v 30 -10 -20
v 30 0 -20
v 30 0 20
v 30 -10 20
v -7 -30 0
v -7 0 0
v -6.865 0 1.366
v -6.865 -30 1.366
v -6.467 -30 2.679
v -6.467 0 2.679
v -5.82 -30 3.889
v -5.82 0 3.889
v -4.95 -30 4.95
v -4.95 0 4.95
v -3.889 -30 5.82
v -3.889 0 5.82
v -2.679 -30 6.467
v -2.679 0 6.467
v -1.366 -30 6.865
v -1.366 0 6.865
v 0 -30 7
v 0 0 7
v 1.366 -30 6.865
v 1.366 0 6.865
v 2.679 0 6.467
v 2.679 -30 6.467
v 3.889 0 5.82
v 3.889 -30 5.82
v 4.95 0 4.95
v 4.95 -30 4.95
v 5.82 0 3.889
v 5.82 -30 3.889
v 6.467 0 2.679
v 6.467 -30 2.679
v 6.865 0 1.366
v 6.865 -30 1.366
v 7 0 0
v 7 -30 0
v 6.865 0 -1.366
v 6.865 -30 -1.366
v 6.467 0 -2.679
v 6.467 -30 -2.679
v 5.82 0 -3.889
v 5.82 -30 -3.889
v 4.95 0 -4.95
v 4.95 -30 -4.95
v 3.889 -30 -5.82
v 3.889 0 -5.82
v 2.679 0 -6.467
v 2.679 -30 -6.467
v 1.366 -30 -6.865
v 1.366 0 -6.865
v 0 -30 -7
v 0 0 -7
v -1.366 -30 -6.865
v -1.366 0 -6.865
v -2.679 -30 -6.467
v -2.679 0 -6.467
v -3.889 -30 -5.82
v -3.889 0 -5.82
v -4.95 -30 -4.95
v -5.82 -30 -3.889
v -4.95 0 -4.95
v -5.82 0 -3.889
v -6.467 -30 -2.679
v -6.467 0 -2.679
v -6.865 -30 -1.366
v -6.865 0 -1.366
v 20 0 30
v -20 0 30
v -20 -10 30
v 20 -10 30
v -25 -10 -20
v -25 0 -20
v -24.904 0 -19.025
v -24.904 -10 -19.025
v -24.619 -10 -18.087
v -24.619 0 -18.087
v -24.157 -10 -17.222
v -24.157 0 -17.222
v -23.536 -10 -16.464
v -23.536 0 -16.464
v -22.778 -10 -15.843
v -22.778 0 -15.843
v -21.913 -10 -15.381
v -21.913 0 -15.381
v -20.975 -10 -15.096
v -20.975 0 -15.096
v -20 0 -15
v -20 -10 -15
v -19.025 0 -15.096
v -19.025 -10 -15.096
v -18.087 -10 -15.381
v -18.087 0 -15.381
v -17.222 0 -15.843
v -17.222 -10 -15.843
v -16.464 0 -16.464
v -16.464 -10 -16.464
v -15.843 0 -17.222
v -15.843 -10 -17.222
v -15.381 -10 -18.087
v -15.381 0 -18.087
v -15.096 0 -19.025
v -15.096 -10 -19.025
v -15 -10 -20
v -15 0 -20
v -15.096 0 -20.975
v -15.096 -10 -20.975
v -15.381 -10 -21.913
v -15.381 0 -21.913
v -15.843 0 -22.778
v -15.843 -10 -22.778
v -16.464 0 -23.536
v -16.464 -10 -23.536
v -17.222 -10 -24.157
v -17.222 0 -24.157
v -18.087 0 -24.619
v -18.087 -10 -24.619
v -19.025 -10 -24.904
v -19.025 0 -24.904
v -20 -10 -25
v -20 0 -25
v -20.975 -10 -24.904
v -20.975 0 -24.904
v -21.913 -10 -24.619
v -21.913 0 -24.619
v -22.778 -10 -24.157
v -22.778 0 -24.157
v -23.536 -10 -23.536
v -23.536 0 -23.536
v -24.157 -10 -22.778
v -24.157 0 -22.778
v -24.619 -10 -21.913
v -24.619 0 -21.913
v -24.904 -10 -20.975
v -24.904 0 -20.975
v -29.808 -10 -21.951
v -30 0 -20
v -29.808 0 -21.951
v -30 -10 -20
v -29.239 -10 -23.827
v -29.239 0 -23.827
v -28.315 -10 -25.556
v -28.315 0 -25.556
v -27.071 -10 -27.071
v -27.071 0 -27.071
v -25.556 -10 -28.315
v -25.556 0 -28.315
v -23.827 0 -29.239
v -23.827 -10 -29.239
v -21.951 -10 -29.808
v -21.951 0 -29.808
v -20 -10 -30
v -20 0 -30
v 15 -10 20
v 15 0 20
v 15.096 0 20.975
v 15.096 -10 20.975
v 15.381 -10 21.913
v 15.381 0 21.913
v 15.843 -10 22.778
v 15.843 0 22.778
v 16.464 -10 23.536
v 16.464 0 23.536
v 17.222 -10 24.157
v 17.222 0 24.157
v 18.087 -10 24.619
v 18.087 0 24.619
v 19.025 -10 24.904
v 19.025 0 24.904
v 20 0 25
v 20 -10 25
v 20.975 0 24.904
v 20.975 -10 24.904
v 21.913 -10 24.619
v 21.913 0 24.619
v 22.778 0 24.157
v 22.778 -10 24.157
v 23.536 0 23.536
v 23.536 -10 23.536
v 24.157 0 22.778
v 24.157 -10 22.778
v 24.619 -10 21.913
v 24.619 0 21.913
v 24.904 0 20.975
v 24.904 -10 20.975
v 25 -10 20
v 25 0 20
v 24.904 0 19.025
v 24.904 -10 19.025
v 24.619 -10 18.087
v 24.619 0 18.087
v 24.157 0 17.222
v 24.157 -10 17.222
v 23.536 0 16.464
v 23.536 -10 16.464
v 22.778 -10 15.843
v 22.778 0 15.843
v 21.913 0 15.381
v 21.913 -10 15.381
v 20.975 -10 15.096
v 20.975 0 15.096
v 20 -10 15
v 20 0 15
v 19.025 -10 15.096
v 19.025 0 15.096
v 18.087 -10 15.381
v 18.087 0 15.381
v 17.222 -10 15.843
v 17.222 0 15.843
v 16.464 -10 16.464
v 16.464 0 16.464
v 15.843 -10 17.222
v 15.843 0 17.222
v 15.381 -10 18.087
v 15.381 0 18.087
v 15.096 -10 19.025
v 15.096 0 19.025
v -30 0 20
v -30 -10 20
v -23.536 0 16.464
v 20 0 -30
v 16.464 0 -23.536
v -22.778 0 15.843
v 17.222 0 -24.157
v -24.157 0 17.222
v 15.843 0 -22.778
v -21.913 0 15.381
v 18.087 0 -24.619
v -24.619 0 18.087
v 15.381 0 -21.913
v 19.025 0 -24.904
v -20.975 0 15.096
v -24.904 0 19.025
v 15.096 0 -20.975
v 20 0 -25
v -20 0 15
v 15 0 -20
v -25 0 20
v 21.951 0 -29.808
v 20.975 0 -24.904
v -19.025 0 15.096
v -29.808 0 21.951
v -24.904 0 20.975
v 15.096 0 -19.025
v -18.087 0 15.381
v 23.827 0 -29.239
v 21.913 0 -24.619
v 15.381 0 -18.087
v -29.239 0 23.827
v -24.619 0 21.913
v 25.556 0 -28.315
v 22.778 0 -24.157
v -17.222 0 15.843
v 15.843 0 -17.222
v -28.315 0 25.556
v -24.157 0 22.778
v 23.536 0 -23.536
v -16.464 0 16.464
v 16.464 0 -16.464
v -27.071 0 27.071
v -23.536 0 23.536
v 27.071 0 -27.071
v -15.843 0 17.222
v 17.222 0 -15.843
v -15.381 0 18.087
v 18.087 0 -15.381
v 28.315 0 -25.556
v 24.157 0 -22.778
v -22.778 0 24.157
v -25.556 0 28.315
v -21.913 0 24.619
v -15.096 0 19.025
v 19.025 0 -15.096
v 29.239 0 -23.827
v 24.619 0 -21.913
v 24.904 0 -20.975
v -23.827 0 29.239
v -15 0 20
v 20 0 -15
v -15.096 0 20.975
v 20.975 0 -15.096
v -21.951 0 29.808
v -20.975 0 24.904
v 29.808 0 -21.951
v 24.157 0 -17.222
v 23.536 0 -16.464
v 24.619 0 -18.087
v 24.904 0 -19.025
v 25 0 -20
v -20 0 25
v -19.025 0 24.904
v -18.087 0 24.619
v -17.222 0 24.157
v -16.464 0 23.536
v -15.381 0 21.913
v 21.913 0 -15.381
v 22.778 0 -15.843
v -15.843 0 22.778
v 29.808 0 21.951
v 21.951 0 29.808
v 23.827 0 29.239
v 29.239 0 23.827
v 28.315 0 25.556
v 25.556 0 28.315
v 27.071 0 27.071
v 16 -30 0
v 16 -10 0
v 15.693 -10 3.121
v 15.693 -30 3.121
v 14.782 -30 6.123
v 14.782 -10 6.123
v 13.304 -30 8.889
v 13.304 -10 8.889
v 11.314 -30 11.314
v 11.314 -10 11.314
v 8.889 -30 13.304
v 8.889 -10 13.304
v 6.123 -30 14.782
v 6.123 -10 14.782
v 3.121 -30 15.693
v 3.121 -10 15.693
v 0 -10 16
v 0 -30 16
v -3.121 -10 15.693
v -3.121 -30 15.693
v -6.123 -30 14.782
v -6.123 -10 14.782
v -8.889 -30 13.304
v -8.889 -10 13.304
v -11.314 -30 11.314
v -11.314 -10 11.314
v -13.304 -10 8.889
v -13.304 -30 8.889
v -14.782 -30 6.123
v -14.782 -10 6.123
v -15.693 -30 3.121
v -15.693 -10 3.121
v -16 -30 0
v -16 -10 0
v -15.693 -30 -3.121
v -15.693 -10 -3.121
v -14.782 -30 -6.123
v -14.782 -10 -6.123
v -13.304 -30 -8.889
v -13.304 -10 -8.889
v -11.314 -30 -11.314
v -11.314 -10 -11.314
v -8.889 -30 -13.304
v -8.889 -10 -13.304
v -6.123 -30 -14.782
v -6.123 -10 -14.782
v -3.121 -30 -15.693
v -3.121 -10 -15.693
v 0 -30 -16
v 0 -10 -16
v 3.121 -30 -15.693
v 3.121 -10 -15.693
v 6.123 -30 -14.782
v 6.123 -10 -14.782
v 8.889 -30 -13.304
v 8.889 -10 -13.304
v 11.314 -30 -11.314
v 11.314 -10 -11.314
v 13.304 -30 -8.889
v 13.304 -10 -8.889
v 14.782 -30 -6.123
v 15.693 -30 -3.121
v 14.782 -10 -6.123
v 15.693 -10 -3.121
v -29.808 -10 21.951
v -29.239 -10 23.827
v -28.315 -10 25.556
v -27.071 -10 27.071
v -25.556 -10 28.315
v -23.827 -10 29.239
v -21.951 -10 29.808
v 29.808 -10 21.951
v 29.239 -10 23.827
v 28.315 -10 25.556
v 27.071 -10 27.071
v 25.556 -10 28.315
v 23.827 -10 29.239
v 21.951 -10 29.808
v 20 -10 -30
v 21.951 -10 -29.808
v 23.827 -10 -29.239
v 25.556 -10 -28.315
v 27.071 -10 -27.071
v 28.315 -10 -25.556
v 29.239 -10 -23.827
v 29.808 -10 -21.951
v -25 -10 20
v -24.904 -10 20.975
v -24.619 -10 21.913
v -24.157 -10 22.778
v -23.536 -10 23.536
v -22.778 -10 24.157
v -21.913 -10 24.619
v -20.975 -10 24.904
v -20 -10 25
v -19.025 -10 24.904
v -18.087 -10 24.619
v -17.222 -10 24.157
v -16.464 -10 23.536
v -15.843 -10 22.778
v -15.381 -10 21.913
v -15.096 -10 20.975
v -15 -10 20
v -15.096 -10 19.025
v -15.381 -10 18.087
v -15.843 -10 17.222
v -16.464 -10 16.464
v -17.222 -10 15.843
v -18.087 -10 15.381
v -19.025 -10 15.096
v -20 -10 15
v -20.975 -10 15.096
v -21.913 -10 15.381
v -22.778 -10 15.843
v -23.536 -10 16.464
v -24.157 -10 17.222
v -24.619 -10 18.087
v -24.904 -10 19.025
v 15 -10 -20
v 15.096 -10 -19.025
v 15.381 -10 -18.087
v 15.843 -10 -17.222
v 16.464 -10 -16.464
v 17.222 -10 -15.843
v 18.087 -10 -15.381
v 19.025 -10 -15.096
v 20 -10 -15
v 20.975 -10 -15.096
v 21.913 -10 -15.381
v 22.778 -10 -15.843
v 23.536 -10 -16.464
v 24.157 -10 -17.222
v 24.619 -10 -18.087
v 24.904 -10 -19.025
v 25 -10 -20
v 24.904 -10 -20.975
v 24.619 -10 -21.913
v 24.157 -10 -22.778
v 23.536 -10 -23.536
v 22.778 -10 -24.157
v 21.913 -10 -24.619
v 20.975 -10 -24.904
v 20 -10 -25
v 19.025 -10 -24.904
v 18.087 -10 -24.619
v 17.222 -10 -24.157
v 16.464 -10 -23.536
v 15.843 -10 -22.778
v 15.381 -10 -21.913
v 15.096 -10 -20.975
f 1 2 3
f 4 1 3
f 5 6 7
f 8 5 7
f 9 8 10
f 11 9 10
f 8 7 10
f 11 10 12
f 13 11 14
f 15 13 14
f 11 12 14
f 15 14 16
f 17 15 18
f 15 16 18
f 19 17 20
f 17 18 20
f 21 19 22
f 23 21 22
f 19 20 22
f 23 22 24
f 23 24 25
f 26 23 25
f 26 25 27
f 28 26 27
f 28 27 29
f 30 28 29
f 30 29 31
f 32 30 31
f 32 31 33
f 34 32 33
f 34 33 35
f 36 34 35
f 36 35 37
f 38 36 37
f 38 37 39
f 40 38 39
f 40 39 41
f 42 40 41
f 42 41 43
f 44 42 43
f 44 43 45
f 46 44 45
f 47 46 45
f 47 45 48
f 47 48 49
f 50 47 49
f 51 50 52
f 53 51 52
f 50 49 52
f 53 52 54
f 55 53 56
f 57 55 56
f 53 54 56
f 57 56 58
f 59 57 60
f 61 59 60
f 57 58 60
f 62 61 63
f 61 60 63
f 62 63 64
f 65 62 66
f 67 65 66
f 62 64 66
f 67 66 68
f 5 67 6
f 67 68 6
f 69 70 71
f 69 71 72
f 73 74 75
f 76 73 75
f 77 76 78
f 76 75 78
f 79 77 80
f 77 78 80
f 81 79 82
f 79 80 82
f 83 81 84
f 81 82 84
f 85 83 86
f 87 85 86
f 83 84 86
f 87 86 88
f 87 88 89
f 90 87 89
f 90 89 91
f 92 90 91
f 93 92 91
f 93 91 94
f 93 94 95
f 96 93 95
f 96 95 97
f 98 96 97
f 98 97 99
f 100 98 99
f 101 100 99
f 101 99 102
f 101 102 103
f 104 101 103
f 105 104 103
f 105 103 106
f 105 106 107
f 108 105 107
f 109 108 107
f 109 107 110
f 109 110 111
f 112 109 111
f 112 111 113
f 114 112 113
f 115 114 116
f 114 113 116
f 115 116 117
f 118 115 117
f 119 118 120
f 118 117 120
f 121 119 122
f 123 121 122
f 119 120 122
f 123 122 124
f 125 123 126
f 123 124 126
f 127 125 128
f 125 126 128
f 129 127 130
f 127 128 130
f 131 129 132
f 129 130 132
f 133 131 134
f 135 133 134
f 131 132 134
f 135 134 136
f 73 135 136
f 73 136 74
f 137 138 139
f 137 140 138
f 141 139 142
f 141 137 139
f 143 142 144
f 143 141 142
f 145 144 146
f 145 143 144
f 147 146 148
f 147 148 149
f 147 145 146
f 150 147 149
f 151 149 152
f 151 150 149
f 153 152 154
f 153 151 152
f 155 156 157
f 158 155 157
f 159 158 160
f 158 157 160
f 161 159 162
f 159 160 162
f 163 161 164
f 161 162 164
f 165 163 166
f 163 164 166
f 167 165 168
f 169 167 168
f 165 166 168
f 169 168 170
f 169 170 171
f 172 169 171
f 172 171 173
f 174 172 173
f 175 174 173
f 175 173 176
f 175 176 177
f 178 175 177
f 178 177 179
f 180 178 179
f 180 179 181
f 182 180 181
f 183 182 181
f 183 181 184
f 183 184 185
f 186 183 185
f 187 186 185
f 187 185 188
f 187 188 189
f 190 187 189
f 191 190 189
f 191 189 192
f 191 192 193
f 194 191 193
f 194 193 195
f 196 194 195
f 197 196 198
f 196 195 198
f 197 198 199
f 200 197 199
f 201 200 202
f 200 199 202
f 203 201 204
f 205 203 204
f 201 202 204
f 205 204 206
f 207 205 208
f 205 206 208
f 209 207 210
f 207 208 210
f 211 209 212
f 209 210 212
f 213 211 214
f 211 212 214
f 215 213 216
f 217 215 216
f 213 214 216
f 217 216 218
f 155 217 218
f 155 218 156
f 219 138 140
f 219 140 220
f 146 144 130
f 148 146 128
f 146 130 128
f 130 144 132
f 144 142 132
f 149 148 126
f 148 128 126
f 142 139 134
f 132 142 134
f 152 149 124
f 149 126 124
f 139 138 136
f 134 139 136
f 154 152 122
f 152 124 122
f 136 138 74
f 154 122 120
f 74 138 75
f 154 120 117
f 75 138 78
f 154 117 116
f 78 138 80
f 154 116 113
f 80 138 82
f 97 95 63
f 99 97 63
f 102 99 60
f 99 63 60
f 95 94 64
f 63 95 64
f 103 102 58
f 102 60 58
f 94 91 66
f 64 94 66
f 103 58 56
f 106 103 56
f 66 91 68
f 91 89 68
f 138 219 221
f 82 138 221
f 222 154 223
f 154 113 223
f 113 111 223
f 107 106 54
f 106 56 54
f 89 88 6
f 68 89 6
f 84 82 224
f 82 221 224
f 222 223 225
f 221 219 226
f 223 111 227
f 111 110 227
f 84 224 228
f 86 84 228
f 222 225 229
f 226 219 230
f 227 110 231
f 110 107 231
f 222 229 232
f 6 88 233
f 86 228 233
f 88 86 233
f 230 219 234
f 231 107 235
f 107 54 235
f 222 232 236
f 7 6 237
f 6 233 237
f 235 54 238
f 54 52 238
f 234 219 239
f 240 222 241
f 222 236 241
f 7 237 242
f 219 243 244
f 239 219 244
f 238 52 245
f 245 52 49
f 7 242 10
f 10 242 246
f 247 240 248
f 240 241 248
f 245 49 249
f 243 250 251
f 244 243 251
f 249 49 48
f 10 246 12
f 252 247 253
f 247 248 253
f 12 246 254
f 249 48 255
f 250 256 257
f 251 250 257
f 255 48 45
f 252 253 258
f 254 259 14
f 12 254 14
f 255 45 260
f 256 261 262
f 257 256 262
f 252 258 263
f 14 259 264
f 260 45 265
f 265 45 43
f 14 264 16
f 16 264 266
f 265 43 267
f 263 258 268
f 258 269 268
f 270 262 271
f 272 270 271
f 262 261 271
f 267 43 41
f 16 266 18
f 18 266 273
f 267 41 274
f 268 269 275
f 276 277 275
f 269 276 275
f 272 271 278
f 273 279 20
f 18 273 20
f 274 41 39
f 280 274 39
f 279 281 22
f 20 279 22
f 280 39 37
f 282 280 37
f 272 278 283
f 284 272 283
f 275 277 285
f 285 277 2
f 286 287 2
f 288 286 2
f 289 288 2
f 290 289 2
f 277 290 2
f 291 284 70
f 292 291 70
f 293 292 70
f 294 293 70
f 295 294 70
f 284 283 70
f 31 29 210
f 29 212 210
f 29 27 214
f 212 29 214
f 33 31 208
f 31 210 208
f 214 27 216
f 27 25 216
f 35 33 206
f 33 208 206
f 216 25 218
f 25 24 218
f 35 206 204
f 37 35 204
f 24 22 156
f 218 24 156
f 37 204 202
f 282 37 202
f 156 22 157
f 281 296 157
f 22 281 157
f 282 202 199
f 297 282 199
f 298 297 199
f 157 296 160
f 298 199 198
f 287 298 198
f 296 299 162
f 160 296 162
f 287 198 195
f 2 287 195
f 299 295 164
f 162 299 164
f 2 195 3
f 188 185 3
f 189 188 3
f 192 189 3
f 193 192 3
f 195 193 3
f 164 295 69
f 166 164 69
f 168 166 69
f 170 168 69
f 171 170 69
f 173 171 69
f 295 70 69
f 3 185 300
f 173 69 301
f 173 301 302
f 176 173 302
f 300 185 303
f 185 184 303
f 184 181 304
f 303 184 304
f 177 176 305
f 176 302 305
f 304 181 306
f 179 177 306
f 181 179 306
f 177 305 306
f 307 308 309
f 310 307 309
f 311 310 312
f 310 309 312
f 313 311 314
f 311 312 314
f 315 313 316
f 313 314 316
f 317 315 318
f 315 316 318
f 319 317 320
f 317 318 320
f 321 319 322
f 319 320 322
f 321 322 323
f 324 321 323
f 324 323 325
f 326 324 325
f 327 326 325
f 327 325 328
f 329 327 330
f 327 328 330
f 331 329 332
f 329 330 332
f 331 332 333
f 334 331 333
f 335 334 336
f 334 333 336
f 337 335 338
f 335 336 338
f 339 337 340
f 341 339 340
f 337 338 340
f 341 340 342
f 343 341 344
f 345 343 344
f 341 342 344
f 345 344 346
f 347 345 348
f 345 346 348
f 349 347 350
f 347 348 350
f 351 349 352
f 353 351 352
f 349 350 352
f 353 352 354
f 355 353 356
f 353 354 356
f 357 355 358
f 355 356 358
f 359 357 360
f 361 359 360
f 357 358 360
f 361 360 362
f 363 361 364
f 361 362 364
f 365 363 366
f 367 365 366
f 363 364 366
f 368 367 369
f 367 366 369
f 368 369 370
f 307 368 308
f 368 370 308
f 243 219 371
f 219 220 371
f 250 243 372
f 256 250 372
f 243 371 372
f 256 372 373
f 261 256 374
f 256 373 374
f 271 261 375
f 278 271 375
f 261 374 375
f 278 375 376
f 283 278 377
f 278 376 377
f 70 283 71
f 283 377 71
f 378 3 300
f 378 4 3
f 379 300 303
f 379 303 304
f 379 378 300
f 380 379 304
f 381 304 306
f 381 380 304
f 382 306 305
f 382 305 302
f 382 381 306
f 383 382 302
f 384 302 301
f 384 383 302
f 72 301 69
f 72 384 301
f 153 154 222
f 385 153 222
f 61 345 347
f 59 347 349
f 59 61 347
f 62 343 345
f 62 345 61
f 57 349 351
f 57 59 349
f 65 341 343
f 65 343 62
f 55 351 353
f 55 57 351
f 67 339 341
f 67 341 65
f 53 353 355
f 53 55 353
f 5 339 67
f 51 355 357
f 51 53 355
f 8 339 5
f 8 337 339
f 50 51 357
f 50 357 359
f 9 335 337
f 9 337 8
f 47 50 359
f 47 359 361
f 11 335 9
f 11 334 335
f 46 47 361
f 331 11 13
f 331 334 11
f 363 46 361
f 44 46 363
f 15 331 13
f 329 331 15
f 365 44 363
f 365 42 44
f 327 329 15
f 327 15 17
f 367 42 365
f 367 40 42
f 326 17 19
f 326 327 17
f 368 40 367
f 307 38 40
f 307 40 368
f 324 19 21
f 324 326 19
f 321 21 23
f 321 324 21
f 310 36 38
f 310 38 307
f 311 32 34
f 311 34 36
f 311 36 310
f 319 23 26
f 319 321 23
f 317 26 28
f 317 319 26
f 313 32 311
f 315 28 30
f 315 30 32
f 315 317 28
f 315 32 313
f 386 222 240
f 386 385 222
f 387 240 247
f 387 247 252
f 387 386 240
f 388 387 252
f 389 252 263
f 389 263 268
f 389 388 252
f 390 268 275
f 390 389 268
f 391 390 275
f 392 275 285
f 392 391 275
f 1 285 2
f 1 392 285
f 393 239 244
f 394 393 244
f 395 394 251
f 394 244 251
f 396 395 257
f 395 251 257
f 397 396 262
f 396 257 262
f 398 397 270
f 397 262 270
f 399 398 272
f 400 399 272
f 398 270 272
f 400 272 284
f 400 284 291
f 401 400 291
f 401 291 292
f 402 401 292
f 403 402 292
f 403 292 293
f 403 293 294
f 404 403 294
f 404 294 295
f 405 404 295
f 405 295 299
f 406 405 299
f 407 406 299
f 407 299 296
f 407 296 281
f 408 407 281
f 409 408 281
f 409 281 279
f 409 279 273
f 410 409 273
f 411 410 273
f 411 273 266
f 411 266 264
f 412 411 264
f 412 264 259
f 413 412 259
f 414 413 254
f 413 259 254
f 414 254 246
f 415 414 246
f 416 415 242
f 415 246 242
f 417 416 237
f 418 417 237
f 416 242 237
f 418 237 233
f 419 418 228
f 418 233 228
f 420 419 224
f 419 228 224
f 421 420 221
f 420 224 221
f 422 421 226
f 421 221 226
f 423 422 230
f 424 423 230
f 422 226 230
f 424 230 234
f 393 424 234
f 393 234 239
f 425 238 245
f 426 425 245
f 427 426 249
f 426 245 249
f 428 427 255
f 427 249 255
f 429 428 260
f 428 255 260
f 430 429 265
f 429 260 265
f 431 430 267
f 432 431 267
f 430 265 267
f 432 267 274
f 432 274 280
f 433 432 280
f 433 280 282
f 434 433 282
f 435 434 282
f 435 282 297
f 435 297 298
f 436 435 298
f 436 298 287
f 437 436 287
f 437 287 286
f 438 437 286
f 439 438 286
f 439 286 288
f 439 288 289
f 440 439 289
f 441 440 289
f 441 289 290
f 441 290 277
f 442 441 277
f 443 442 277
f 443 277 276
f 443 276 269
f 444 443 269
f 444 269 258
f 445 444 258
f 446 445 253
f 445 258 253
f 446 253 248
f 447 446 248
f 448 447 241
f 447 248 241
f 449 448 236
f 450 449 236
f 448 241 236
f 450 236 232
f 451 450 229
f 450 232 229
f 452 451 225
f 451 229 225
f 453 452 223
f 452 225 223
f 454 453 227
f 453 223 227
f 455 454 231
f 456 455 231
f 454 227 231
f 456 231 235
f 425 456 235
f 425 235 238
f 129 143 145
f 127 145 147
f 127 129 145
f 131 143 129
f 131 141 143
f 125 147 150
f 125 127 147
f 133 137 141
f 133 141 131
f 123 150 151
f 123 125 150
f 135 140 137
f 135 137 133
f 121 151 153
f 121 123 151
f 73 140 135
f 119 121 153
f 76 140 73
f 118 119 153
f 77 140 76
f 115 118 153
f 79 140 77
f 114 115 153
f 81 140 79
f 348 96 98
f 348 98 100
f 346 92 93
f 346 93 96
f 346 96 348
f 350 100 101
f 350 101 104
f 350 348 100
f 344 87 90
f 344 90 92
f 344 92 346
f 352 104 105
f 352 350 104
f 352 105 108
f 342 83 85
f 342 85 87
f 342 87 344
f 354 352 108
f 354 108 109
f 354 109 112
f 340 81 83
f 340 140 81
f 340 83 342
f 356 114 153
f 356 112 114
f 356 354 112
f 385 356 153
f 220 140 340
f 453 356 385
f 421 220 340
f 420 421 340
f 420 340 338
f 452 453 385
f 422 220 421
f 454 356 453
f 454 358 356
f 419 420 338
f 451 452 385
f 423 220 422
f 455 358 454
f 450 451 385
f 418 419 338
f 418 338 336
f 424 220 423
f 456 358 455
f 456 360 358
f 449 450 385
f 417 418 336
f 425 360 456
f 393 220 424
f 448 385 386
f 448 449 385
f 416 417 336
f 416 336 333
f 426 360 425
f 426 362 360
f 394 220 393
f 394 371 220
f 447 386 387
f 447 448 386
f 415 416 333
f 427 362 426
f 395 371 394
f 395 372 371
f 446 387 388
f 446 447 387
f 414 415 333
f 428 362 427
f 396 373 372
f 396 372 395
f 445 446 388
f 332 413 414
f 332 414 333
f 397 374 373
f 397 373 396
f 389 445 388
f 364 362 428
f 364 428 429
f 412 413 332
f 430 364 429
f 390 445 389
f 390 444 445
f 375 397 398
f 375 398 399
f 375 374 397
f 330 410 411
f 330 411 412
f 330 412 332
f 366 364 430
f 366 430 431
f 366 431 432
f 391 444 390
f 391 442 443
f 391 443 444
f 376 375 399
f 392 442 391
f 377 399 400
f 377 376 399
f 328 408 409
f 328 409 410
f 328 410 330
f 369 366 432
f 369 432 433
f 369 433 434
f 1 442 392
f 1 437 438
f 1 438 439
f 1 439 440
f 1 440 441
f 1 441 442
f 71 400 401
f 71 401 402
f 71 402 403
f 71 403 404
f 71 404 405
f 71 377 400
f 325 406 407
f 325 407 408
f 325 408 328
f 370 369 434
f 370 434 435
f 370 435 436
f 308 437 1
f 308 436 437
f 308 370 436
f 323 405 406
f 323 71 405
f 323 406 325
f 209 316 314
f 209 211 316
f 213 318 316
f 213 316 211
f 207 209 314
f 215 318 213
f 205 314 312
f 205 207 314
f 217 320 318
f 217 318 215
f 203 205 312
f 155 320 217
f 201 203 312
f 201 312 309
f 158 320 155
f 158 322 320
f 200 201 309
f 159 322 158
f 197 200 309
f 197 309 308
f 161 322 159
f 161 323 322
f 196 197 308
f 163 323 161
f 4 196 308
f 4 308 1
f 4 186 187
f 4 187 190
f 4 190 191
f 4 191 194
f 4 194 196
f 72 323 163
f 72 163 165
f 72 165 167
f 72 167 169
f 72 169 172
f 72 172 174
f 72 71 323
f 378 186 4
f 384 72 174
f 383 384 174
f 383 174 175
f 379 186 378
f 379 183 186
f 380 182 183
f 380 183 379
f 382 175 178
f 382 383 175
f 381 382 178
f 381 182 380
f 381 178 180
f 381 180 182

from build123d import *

# Parameters (mm, degrees)
F0_W     = 60
F0_H     = 60
F1_DEPTH = 10
F2_R     = 10
F4_D     = 10
F5_R     = 16
F6_DEPTH = 20
F8_D     = 14


with BuildPart() as f1:
    # F0 (on Front) → F1 (new body)
    with BuildSketch(Plane.XZ):
        Rectangle(F0_W, F0_H)
    extrude(amount=F1_DEPTH)

    # F2
    f2_edges = [f1.edges().sort_by_distance(p)[0] for p in [
        (-30, -5, 30),
        (-30, -5, -30),
        (30, -5, 30),
        (30, -5, -30),
    ]]
    fillet(f2_edges, radius=F2_R)

    # F4 (through all)
    with Locations(Plane.XZ.offset(10)):
        with Locations((-20, 20), (20, 20), (20, -20), (-20, -20)):
            Hole(F4_D / 2)

    # F5 (on face) → F6 (join)
    with BuildSketch(Plane.XZ.offset(10)):
        Circle(F5_R)
    extrude(amount=F6_DEPTH)

    # F8 (through all)
    with Locations(Plane.XZ.offset(30)):
        with Locations((0, 0)):
            Hole(F8_D / 2)


solid = f1.part
